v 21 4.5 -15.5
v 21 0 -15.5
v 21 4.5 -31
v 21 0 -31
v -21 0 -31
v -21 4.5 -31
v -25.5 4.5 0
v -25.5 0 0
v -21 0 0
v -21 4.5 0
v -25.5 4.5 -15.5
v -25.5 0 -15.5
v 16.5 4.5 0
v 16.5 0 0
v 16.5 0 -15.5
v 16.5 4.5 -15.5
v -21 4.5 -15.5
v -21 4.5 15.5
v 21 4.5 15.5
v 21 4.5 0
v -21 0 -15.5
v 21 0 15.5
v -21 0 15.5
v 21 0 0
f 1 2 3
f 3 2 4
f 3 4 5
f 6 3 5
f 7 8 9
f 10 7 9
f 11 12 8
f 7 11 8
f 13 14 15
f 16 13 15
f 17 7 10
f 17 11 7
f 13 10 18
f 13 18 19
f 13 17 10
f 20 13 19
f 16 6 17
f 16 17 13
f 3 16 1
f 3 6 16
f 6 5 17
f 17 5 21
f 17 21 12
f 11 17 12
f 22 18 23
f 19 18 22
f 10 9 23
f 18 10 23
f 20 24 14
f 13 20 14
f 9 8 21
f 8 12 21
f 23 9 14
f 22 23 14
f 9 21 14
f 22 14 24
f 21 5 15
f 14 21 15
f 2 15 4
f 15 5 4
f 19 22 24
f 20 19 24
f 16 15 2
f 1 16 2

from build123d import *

# Parameters (mm, degrees)
BOSS_EXTRUDE1_DEPTH = 4.5
SKETCH2_W           = 51.255573275
SKETCH2_H           = 30.547230998
CUT_EXTRUDE1_DEPTH  = 5.5


with BuildPart() as part:
    # Sketch1 → Boss-Extrude1 (new body)
    with BuildSketch(Plane(origin=(0, 0, 0), x_dir=(1, 0, 0), z_dir=(0, 1, 0))):
        Polygon((-21, 0), (-21, -15.5), (-25.5, -15.5), (-25.5, -31), (-21, -31), (-21, -35.5), (-16.5, -35.5), (-16.5, -31), (0, -31), (0, -35.5), (4.5, -35.5), (4.5, -31), (16.5, -31), (16.5, -15.5), (21, -15.5), (21, 0), (16.5, 0), (16.5, 15.5), (21, 15.5), (21, 31), (-21, 31), (-21, 15.5), (-25.5, 15.5), (-25.5, 0), align=None)
    extrude(amount=BOSS_EXTRUDE1_DEPTH)

    # Sketch2 → Cut-Extrude1 (cut, through all)
    with BuildSketch(Plane(origin=(0, 4.5, 0), x_dir=(1, 0, 0), z_dir=(0, 1, 0))):
        with Locations((0.127786638, -30.773615499)):
            Rectangle(SKETCH2_W, SKETCH2_H)
    extrude(amount=-CUT_EXTRUDE1_DEPTH, mode=Mode.SUBTRACT)


solid = part.part
